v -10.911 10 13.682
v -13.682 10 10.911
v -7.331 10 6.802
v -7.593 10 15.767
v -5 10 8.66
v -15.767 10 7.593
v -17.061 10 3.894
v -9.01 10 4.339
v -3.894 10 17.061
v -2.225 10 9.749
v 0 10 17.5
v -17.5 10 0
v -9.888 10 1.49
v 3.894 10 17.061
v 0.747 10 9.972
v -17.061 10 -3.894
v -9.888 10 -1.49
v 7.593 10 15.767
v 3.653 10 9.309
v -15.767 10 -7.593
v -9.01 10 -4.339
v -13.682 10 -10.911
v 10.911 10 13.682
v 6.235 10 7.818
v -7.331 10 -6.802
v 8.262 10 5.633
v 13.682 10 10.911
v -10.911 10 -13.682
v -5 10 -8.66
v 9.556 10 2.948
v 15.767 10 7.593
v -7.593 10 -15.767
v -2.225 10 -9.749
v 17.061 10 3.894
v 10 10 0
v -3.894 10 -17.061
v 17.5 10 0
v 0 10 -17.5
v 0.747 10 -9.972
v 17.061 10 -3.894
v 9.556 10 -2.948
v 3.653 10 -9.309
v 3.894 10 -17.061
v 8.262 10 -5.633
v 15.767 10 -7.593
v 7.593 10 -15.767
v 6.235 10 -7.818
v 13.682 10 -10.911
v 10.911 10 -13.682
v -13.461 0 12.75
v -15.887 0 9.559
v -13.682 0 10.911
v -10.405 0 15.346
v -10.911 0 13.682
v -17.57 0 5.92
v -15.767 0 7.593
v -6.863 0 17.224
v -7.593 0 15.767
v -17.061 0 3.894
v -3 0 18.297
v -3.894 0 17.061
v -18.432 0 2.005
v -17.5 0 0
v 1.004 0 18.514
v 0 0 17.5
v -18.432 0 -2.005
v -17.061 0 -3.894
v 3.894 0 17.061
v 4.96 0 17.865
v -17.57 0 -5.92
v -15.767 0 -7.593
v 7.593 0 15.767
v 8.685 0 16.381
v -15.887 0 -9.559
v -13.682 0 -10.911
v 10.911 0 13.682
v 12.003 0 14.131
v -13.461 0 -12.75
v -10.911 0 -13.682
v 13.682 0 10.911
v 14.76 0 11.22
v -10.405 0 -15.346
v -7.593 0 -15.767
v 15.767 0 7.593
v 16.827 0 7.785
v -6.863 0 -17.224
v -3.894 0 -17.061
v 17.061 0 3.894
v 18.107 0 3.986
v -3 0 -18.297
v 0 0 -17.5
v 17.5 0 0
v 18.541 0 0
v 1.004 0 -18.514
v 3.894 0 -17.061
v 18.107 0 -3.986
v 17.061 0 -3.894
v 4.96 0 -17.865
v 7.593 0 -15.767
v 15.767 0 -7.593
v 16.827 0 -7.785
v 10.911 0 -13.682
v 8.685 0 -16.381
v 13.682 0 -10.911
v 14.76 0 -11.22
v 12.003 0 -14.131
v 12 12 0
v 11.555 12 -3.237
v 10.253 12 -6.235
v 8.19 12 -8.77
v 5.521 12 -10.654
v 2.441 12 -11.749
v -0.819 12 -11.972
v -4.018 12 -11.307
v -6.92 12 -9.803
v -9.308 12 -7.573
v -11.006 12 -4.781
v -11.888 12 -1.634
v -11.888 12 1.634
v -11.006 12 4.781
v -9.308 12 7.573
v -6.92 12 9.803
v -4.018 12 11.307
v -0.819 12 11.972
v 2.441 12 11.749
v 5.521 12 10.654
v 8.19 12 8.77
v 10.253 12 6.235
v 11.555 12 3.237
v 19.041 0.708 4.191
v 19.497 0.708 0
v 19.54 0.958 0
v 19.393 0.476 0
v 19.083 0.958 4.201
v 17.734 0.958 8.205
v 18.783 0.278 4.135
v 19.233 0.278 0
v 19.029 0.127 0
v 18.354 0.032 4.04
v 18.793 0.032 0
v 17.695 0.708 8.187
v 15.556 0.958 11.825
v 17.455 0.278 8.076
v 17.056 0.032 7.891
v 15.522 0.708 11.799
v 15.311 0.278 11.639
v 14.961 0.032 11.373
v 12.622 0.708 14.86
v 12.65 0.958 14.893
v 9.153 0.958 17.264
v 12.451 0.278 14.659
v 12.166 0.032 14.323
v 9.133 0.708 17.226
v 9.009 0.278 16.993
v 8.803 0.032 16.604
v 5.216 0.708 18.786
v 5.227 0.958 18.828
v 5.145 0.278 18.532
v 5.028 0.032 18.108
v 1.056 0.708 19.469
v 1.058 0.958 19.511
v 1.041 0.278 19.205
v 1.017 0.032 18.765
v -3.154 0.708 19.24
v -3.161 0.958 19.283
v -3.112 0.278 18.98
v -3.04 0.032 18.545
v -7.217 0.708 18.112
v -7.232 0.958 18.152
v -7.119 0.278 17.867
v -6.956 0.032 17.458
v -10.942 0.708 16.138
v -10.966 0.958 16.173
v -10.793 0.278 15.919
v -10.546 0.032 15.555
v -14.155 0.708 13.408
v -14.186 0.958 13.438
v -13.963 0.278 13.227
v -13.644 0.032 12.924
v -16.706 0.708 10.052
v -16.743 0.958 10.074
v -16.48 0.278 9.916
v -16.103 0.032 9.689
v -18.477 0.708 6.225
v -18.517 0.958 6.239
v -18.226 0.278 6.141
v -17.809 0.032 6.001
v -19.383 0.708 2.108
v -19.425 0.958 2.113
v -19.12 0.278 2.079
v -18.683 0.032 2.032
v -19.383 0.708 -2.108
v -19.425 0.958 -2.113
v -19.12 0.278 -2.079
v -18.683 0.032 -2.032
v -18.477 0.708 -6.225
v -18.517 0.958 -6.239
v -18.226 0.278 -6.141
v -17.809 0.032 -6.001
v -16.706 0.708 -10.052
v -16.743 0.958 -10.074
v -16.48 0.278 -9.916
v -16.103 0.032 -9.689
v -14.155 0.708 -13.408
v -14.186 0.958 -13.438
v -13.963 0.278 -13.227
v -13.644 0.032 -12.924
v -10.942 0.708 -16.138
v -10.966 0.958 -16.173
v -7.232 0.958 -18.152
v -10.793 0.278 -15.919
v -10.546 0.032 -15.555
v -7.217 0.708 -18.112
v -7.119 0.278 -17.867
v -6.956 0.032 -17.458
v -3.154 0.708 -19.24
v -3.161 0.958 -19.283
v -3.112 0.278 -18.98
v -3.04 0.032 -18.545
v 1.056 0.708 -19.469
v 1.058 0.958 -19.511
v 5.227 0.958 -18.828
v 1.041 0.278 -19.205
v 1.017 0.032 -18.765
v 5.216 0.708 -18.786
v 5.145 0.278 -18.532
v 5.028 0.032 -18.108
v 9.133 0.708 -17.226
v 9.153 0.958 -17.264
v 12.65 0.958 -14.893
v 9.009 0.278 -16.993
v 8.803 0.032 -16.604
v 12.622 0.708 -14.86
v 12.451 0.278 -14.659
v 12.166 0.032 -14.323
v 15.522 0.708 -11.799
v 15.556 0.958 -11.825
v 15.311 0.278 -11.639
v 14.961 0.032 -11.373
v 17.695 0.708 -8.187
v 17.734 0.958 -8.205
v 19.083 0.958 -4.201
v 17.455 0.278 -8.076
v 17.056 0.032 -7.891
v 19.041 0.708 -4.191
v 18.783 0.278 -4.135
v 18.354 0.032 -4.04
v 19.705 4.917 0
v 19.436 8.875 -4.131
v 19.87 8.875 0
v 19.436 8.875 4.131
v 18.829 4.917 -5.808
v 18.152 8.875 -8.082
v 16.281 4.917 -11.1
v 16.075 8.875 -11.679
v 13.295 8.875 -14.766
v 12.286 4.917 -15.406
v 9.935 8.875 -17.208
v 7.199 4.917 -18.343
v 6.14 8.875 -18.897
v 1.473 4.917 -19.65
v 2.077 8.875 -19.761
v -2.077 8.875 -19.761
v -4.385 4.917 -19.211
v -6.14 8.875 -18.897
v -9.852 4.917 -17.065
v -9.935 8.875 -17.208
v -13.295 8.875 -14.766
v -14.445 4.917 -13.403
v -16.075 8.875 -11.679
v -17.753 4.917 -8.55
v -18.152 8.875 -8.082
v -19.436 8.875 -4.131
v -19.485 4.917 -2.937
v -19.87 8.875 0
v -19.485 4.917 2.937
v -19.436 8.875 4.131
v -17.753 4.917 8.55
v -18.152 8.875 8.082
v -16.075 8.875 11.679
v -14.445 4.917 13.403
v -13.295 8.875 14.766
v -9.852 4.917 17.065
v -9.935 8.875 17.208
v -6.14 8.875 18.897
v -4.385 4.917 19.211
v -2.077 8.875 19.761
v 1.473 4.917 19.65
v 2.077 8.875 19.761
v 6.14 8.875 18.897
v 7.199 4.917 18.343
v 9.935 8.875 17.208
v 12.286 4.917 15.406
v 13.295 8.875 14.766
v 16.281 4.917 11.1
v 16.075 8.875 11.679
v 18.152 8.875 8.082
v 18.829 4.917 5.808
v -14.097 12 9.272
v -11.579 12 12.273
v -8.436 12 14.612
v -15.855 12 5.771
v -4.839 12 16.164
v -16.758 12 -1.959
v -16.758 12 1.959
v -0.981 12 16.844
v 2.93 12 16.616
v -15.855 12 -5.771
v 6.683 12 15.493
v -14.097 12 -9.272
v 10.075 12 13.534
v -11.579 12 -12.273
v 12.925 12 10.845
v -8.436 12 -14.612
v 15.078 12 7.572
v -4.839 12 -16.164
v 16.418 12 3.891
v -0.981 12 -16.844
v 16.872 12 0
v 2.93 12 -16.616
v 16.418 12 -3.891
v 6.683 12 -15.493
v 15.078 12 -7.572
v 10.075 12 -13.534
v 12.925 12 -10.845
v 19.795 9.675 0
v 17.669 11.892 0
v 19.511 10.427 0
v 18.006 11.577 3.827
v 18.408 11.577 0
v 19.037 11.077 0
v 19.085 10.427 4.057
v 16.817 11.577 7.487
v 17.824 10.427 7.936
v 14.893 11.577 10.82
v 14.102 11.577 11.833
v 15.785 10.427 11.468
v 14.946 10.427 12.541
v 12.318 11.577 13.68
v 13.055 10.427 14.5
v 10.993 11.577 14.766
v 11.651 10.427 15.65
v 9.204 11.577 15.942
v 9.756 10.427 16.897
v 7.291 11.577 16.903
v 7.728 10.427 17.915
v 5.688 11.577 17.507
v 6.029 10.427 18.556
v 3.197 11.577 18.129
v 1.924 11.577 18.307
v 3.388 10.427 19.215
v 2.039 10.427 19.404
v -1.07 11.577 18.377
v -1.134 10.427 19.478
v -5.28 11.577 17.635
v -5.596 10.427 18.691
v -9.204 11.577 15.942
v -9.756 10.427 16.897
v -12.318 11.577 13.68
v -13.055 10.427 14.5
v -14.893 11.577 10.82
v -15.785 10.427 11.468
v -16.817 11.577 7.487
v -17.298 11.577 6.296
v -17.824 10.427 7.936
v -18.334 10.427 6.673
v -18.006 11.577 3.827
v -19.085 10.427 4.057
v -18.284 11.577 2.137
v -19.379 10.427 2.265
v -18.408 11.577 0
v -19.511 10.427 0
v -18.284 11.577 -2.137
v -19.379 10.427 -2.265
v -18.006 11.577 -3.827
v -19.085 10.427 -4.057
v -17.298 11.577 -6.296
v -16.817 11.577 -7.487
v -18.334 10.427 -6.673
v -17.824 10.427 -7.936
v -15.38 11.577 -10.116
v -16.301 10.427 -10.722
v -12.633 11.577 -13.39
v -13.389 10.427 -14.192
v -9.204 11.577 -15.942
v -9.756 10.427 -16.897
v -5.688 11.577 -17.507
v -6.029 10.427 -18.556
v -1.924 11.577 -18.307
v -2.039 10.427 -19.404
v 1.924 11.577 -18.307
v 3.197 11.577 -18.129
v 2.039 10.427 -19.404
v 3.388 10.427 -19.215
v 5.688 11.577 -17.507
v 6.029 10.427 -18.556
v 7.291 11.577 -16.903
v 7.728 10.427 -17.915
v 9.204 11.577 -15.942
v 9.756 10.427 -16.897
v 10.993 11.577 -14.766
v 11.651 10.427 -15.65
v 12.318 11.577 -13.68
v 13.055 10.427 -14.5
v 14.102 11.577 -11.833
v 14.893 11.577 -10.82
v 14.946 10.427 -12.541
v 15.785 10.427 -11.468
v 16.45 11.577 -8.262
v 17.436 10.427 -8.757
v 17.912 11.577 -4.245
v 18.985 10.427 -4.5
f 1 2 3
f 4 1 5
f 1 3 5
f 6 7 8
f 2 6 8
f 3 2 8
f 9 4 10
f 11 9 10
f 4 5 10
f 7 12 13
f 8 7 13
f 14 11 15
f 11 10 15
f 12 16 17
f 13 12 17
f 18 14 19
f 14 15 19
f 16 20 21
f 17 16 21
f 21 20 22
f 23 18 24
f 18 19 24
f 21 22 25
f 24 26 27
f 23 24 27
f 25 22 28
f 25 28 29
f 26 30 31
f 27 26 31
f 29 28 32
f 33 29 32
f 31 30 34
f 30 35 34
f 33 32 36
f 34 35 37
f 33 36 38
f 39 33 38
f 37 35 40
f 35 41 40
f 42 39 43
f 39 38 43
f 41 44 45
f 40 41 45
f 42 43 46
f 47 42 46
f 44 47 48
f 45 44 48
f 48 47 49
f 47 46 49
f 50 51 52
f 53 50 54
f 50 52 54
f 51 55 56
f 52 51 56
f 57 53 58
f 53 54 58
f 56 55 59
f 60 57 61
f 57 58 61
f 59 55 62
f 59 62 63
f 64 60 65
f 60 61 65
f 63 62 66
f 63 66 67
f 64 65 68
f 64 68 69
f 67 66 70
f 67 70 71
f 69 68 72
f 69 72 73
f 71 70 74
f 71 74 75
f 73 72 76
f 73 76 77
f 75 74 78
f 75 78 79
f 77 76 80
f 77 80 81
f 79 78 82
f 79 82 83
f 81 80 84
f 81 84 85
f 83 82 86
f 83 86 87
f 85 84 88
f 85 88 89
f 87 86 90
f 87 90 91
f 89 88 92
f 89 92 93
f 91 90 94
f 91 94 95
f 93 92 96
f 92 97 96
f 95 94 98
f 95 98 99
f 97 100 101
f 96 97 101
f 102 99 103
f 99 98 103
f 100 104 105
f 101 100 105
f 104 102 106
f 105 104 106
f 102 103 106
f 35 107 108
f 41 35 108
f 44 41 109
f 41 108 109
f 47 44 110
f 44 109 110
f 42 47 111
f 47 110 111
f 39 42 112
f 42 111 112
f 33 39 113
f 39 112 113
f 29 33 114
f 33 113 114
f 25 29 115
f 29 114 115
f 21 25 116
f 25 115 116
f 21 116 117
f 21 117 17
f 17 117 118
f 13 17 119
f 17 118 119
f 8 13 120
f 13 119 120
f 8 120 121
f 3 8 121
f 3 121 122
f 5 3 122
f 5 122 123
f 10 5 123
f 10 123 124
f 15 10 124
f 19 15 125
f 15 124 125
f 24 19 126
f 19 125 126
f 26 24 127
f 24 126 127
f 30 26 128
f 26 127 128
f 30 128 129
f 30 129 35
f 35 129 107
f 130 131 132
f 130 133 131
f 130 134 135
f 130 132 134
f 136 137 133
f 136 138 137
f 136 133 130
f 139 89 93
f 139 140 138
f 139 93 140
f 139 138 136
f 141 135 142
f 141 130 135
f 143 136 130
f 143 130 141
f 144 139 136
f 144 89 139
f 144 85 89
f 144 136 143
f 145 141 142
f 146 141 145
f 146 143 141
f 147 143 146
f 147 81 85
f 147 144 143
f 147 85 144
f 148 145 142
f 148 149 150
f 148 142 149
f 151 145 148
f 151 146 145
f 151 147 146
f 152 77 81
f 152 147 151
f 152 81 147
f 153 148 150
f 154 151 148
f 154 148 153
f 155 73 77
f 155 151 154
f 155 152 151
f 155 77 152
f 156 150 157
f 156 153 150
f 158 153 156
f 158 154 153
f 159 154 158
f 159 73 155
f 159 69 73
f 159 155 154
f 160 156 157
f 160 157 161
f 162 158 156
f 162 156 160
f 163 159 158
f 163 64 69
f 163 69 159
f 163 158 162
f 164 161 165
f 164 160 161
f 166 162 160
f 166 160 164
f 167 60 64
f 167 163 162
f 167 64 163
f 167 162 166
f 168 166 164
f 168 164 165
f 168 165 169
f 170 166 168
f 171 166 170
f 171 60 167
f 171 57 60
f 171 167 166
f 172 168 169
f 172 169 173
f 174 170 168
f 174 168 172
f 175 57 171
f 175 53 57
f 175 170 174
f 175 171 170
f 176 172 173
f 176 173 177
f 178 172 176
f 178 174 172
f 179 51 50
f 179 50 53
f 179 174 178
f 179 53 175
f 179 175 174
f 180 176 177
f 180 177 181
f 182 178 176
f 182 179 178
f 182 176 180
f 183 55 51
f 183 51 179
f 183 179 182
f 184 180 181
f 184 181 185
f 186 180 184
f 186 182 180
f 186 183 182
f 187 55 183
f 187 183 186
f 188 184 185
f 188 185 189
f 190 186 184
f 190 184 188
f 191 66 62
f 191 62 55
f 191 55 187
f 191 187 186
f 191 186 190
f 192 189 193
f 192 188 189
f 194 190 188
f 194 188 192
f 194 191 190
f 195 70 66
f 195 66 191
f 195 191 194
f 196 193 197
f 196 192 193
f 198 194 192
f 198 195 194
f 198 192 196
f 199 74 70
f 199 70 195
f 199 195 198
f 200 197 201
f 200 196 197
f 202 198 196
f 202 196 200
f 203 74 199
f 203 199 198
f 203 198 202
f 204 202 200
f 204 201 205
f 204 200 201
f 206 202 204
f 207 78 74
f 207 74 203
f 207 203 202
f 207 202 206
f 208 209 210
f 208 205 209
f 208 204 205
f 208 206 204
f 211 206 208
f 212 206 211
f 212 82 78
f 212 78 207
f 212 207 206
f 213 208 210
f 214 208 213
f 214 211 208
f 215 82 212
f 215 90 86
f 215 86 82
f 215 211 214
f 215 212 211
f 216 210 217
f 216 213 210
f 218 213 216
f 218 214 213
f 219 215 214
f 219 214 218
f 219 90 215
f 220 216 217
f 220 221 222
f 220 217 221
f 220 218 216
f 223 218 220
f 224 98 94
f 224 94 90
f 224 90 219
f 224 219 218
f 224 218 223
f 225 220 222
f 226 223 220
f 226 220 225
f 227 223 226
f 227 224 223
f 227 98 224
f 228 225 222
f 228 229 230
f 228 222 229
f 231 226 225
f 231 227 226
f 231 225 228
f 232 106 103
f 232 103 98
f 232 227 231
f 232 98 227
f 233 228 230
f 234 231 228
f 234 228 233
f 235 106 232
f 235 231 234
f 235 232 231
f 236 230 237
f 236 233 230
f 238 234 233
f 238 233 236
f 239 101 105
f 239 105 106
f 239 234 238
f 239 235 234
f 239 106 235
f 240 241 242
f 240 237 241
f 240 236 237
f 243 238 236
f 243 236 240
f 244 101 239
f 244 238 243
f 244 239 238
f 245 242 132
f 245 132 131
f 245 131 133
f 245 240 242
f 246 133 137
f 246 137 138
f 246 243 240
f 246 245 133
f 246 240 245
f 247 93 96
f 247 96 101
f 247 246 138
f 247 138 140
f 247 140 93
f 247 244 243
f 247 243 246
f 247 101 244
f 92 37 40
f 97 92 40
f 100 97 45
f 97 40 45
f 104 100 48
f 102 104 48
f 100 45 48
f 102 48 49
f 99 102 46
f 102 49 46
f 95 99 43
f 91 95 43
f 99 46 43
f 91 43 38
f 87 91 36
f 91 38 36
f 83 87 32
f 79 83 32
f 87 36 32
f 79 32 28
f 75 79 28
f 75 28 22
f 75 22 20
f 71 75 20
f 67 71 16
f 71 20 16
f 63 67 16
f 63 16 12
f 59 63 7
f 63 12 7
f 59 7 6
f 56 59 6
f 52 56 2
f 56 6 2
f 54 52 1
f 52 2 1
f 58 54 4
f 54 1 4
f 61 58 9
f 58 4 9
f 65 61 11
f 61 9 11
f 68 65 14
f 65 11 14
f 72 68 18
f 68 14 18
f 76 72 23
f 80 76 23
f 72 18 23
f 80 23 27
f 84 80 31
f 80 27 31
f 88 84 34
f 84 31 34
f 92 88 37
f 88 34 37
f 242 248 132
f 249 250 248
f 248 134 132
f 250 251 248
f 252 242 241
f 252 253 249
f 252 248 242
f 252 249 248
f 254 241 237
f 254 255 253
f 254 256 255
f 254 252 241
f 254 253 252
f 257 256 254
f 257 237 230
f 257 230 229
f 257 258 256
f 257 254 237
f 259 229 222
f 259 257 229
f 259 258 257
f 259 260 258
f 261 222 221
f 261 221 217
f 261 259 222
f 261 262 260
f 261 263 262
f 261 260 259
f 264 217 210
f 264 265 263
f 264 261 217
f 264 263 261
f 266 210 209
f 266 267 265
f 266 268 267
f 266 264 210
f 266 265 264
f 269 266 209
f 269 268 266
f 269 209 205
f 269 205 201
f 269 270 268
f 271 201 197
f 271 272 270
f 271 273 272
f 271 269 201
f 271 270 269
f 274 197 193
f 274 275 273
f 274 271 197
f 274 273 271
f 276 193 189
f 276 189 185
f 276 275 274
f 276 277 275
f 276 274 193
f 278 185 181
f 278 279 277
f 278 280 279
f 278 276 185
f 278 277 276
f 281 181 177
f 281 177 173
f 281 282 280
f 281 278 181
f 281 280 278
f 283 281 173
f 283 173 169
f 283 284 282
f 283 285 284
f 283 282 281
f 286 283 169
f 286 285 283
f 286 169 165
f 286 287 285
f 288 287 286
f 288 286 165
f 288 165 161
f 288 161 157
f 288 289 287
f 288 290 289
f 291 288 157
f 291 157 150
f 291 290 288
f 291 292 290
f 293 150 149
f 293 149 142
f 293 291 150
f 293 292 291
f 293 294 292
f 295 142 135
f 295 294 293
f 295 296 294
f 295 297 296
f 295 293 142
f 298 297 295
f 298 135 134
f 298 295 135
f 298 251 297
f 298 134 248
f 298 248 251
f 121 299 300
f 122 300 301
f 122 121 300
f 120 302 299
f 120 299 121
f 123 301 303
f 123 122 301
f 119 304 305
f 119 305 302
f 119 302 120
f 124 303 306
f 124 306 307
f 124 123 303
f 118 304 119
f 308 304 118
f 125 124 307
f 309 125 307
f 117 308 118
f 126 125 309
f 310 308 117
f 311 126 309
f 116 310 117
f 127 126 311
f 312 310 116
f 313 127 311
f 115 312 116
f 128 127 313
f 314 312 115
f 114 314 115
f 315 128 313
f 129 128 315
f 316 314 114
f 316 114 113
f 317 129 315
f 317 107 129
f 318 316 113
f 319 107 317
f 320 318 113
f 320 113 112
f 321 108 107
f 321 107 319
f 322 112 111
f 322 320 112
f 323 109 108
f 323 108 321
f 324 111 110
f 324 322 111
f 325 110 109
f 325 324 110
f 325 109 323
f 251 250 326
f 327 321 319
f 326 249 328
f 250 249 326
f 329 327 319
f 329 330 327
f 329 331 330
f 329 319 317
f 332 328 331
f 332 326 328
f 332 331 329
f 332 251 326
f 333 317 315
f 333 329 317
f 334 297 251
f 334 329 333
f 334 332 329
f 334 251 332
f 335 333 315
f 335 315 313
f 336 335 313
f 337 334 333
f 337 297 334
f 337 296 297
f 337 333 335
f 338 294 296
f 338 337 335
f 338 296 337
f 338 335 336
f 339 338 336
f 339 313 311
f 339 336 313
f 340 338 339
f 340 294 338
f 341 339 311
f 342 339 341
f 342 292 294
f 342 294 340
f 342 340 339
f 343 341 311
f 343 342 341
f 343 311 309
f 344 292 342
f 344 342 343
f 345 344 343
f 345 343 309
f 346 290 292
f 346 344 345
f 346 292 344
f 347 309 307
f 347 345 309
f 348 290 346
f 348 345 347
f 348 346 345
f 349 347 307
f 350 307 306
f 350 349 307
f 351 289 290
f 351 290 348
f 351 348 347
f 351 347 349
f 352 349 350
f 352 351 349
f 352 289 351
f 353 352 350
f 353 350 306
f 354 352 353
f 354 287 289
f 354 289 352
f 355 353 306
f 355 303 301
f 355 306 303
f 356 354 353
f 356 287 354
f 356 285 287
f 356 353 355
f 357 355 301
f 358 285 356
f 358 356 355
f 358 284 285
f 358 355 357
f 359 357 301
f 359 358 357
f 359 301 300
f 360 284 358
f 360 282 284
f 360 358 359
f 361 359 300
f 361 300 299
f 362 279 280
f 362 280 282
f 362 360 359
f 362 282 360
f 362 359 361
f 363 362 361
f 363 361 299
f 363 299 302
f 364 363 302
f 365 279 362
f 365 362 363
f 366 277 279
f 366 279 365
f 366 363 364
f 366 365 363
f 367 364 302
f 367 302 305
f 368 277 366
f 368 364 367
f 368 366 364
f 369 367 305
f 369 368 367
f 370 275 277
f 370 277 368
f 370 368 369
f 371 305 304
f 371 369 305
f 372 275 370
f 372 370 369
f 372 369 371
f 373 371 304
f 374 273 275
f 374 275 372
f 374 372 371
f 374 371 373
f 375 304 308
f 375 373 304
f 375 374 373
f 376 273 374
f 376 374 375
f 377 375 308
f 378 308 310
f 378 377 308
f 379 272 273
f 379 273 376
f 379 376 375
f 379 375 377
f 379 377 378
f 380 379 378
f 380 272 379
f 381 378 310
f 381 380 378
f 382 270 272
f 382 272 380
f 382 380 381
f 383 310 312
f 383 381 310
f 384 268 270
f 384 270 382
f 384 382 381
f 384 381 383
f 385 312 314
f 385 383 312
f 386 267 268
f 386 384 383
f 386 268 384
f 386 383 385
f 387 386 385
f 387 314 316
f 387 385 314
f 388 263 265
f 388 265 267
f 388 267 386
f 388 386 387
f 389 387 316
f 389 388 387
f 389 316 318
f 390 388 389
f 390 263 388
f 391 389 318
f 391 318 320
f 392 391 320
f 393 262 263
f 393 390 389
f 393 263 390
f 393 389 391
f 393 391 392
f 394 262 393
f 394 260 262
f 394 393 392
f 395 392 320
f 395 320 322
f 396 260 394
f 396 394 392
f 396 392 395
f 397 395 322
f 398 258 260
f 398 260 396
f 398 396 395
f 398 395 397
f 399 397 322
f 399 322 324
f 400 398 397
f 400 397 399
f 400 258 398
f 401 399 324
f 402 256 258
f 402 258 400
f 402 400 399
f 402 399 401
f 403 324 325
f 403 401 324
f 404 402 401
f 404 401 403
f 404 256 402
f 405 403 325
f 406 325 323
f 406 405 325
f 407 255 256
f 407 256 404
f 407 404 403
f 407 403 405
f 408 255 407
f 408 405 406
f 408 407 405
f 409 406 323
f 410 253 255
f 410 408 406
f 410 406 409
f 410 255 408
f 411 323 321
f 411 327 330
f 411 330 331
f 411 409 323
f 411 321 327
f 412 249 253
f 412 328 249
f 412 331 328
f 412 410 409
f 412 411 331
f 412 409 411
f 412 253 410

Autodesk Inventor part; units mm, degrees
ref_plane "YZ Plane" through (0, 0, 0) normal (1, 0, 0) x (0, 1, 0)
ref_plane "XZ Plane" through (0, 0, 0) normal (0, 1, 0) x (-1, 0, 0)
ref_plane "XY Plane" through (0, 0, 0) normal (0, 0, 1) x (1, 0, 0)
sketch "Skizze1" plane through (0, 0, 0) normal (0, 0, 1) x (1, 0, 0)
  line L0 (10, 12) -> (20, 12)
  line L1 (20, 12) -> (19.5, 0)
  line L2 (19.5, 0) -> (17.5, 0)
  line L3 (17.5, 0) -> (17.5, 10)
  line L4 (17.5, 10) -> (10, 10)
  line L5 (10, 10) -> (10, 12)
  line L6 (0, 0) -> (0, 8.6013)
  line L7 (18.5, 0) -> (18.5, 1.5)
  line L8 (18.5, 1.5) -> (17.5, 1.5)
  dimension "d0" = 35
  dimension "d1" = 10
  dimension "d2" = 20
  dimension "d4" = 2
  dimension "d9" = 10
  dimension "d10" = 2
  dimension "d15" = 1
  dimension "d16" = 1.5
revolve "Umdrehung1" add sketch "Skizze1" angle 360 about axis through (0, 0, 0) along (0, 1, 0)
chamfer "Fasen1" distance 2 angle 45 1 edges at (-10, 12, 0)
thread "Gewinde1" size "M35x1.5" class "6H" standard "ISO Metric profile" full length
fillet "Rundung1" radius 3 1 edges at (-20, 12, 0)
fillet "Rundung2" radius 1 1 edges at (-19.5, 0, 0)
properties part number "Deckel"
